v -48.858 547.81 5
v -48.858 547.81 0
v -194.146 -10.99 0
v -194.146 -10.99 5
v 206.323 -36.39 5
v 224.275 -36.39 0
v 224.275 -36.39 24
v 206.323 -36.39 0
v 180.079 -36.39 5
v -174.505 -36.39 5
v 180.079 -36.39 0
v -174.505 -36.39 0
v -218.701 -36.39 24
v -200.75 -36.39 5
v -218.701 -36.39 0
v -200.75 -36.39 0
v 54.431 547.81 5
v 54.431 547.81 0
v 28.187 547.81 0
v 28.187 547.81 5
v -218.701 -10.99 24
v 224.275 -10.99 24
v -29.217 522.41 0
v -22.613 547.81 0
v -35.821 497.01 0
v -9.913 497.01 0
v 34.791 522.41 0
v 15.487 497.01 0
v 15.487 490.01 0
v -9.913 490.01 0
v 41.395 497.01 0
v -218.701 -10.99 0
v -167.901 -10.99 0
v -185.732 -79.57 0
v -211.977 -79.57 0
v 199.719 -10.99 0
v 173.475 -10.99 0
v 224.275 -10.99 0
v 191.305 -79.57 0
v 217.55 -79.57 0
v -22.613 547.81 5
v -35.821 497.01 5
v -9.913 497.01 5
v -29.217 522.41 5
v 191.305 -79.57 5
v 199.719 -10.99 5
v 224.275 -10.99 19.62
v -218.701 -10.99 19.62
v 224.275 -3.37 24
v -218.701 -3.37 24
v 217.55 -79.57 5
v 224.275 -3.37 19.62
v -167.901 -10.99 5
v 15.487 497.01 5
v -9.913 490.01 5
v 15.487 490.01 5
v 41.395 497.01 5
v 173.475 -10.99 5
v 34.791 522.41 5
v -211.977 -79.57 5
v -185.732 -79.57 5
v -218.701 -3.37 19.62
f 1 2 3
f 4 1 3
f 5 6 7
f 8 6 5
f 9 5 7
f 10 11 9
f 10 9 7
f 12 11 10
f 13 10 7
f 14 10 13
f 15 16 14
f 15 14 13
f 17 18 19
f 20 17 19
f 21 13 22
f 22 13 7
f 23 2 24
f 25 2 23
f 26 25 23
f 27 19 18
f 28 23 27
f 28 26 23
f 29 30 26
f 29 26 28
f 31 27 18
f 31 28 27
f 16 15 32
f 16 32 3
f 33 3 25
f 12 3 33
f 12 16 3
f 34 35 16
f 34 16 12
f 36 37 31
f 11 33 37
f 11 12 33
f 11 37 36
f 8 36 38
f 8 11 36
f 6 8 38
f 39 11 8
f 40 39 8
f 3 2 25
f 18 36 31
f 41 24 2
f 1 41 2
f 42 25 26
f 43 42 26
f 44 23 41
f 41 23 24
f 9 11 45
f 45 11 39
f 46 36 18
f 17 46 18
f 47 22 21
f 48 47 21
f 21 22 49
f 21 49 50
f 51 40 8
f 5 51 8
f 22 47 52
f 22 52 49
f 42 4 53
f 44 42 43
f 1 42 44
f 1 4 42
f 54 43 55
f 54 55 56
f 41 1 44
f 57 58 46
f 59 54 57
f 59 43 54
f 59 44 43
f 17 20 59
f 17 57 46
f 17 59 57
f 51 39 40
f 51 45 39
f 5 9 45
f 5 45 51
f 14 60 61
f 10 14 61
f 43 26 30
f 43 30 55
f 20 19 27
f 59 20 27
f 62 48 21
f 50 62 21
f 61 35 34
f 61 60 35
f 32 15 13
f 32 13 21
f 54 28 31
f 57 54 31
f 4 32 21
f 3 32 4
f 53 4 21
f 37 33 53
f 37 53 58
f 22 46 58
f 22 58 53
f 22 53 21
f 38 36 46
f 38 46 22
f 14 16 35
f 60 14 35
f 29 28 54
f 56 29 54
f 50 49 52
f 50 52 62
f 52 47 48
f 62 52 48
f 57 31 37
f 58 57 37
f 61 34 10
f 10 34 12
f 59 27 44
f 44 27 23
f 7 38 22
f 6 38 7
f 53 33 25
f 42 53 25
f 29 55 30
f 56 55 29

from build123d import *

# Parameters (mm, degrees)
F1_DEPTH  = 5
F3_DEPTH  = 24
F4_W      = 25.4
F4_H      = 5
F5_DEPTH  = 7
F7_W      = 508
F7_H      = 81.5656109944
F8_DEPTH  = 7.62
F9_W      = 442.976
F9_H      = 4.38
F10_DEPTH = 7.62


with BuildPart() as f1:
    # F0 (on Top) → F1 (new body)
    with BuildSketch(Plane.XY):
        Polygon((-29.2173255483, 522.40974645), (-22.6133255483, 547.80974645), (-48.8578071778, 547.80974645), (-187.7133255483, 13.7500604096), (-187.7133255483, -87.19025355), (-174.5053255483, -36.39025355), (-167.9013255483, -10.99025355), (-35.8213255483, 497.00974645), align=None)
        Polygon((34.7906744517, 522.40974645), (-29.2173255483, 522.40974645), (-35.8213255483, 497.00974645), (41.3946744517, 497.00974645), align=None)
        Polygon((54.4311560812, 547.80974645), (28.1866744517, 547.80974645), (34.7906744517, 522.40974645), (41.3946744517, 497.00974645), (173.4746744517, -10.99025355), (180.0786744517, -36.39025355), (193.2866744517, -87.19025355), (193.2866744517, 13.7500604096), align=None)
        Polygon((173.4746744517, -10.99025355), (-167.9013255483, -10.99025355), (-174.5053255483, -36.39025355), (180.0786744517, -36.39025355), align=None)
        Polygon((-187.7133255483, -87.19025355), (-187.7133255483, 13.7500604096), (-212.2960172207, -80.7987537151), align=None)
        Polygon((217.8693661241, -80.7987537151), (193.2866744517, 13.7500604096), (193.2866744517, -87.19025355), align=None)
    extrude(amount=F1_DEPTH)

    # F2 (on face) → F3 (join)
    with BuildSketch(Plane(origin=(0, 0, 0), x_dir=(1, 0, 0), z_dir=(0, 0, -1))):
        Polygon((-218.7013255483, 10.99025355), (-167.9013255483, 10.99025355), (173.4746744517, 10.99025355), (224.2746744517, 10.99025355), (224.2746744517, 36.39025355), (180.0786744517, 36.39025355), (-174.5053255483, 36.39025355), (-218.7013255483, 36.39025355), align=None)
    extrude(amount=-F3_DEPTH)

    # F4 (on face) → F5 (join)
    with BuildSketch(Plane.XZ.offset(-497.00974645)):
        with Locations((2.7866744517, 2.5)):
            Rectangle(F4_W, F4_H)
    extrude(amount=F5_DEPTH)

    # F7 (on 3pt) → F8 (cut)
    with BuildSketch(Plane.XZ.offset(87.19025355)):
        with Locations((4.5045018196, 1.0812641121)):
            Rectangle(F7_W, F7_H)
    extrude(amount=-F8_DEPTH, mode=Mode.SUBTRACT)


with BuildPart() as f10:
    # F9 (on face) → F10 (new body)
    with BuildSketch(Plane(origin=(0, -10.99025355, 0), x_dir=(-1, 0, 0), z_dir=(0, 1, 0))):
        with Locations((-2.7866744517, 21.81)):
            Rectangle(F9_W, F9_H)
    extrude(amount=F10_DEPTH)


solid = Compound([f1.part, f10.part])
